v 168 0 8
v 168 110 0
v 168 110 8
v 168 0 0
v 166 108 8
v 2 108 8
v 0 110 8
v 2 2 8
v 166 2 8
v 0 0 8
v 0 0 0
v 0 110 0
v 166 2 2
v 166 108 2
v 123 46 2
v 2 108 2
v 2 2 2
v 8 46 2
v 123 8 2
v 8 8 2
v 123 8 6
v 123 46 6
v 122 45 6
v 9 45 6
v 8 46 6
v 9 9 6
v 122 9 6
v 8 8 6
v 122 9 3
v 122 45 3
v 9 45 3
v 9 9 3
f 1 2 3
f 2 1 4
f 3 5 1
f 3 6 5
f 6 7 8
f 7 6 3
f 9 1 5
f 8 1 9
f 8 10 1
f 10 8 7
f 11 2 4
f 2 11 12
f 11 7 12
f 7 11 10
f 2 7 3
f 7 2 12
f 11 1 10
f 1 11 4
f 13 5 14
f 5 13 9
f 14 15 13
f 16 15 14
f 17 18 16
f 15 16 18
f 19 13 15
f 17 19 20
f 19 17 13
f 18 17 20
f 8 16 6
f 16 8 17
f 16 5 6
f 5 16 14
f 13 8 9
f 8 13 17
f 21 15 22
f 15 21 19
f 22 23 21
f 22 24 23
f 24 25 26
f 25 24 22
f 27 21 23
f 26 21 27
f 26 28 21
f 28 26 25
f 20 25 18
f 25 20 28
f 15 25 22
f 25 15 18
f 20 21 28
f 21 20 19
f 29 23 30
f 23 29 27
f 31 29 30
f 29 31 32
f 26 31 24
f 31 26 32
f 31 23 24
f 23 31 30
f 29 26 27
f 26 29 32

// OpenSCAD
// Electronics tray for a Pelican 1120-class box. Units: mm.
// Print in PETG. Not required — foam + zip ties also work.

tray_l = 168;
tray_w = 110;
tray_h = 8;
wall = 2;

difference() {
  cube([tray_l, tray_w, tray_h]);
  translate([wall, wall, 2])
    cube([tray_l - 2 * wall, tray_w - 2 * wall, tray_h]);
}

// Board pocket (T-A7670G ~111 x 34 mm)
translate([8, 8, 2])
  difference() {
    cube([115, 38, 4]);
    translate([1, 1, 1]) cube([113, 36, 4]);
  }
